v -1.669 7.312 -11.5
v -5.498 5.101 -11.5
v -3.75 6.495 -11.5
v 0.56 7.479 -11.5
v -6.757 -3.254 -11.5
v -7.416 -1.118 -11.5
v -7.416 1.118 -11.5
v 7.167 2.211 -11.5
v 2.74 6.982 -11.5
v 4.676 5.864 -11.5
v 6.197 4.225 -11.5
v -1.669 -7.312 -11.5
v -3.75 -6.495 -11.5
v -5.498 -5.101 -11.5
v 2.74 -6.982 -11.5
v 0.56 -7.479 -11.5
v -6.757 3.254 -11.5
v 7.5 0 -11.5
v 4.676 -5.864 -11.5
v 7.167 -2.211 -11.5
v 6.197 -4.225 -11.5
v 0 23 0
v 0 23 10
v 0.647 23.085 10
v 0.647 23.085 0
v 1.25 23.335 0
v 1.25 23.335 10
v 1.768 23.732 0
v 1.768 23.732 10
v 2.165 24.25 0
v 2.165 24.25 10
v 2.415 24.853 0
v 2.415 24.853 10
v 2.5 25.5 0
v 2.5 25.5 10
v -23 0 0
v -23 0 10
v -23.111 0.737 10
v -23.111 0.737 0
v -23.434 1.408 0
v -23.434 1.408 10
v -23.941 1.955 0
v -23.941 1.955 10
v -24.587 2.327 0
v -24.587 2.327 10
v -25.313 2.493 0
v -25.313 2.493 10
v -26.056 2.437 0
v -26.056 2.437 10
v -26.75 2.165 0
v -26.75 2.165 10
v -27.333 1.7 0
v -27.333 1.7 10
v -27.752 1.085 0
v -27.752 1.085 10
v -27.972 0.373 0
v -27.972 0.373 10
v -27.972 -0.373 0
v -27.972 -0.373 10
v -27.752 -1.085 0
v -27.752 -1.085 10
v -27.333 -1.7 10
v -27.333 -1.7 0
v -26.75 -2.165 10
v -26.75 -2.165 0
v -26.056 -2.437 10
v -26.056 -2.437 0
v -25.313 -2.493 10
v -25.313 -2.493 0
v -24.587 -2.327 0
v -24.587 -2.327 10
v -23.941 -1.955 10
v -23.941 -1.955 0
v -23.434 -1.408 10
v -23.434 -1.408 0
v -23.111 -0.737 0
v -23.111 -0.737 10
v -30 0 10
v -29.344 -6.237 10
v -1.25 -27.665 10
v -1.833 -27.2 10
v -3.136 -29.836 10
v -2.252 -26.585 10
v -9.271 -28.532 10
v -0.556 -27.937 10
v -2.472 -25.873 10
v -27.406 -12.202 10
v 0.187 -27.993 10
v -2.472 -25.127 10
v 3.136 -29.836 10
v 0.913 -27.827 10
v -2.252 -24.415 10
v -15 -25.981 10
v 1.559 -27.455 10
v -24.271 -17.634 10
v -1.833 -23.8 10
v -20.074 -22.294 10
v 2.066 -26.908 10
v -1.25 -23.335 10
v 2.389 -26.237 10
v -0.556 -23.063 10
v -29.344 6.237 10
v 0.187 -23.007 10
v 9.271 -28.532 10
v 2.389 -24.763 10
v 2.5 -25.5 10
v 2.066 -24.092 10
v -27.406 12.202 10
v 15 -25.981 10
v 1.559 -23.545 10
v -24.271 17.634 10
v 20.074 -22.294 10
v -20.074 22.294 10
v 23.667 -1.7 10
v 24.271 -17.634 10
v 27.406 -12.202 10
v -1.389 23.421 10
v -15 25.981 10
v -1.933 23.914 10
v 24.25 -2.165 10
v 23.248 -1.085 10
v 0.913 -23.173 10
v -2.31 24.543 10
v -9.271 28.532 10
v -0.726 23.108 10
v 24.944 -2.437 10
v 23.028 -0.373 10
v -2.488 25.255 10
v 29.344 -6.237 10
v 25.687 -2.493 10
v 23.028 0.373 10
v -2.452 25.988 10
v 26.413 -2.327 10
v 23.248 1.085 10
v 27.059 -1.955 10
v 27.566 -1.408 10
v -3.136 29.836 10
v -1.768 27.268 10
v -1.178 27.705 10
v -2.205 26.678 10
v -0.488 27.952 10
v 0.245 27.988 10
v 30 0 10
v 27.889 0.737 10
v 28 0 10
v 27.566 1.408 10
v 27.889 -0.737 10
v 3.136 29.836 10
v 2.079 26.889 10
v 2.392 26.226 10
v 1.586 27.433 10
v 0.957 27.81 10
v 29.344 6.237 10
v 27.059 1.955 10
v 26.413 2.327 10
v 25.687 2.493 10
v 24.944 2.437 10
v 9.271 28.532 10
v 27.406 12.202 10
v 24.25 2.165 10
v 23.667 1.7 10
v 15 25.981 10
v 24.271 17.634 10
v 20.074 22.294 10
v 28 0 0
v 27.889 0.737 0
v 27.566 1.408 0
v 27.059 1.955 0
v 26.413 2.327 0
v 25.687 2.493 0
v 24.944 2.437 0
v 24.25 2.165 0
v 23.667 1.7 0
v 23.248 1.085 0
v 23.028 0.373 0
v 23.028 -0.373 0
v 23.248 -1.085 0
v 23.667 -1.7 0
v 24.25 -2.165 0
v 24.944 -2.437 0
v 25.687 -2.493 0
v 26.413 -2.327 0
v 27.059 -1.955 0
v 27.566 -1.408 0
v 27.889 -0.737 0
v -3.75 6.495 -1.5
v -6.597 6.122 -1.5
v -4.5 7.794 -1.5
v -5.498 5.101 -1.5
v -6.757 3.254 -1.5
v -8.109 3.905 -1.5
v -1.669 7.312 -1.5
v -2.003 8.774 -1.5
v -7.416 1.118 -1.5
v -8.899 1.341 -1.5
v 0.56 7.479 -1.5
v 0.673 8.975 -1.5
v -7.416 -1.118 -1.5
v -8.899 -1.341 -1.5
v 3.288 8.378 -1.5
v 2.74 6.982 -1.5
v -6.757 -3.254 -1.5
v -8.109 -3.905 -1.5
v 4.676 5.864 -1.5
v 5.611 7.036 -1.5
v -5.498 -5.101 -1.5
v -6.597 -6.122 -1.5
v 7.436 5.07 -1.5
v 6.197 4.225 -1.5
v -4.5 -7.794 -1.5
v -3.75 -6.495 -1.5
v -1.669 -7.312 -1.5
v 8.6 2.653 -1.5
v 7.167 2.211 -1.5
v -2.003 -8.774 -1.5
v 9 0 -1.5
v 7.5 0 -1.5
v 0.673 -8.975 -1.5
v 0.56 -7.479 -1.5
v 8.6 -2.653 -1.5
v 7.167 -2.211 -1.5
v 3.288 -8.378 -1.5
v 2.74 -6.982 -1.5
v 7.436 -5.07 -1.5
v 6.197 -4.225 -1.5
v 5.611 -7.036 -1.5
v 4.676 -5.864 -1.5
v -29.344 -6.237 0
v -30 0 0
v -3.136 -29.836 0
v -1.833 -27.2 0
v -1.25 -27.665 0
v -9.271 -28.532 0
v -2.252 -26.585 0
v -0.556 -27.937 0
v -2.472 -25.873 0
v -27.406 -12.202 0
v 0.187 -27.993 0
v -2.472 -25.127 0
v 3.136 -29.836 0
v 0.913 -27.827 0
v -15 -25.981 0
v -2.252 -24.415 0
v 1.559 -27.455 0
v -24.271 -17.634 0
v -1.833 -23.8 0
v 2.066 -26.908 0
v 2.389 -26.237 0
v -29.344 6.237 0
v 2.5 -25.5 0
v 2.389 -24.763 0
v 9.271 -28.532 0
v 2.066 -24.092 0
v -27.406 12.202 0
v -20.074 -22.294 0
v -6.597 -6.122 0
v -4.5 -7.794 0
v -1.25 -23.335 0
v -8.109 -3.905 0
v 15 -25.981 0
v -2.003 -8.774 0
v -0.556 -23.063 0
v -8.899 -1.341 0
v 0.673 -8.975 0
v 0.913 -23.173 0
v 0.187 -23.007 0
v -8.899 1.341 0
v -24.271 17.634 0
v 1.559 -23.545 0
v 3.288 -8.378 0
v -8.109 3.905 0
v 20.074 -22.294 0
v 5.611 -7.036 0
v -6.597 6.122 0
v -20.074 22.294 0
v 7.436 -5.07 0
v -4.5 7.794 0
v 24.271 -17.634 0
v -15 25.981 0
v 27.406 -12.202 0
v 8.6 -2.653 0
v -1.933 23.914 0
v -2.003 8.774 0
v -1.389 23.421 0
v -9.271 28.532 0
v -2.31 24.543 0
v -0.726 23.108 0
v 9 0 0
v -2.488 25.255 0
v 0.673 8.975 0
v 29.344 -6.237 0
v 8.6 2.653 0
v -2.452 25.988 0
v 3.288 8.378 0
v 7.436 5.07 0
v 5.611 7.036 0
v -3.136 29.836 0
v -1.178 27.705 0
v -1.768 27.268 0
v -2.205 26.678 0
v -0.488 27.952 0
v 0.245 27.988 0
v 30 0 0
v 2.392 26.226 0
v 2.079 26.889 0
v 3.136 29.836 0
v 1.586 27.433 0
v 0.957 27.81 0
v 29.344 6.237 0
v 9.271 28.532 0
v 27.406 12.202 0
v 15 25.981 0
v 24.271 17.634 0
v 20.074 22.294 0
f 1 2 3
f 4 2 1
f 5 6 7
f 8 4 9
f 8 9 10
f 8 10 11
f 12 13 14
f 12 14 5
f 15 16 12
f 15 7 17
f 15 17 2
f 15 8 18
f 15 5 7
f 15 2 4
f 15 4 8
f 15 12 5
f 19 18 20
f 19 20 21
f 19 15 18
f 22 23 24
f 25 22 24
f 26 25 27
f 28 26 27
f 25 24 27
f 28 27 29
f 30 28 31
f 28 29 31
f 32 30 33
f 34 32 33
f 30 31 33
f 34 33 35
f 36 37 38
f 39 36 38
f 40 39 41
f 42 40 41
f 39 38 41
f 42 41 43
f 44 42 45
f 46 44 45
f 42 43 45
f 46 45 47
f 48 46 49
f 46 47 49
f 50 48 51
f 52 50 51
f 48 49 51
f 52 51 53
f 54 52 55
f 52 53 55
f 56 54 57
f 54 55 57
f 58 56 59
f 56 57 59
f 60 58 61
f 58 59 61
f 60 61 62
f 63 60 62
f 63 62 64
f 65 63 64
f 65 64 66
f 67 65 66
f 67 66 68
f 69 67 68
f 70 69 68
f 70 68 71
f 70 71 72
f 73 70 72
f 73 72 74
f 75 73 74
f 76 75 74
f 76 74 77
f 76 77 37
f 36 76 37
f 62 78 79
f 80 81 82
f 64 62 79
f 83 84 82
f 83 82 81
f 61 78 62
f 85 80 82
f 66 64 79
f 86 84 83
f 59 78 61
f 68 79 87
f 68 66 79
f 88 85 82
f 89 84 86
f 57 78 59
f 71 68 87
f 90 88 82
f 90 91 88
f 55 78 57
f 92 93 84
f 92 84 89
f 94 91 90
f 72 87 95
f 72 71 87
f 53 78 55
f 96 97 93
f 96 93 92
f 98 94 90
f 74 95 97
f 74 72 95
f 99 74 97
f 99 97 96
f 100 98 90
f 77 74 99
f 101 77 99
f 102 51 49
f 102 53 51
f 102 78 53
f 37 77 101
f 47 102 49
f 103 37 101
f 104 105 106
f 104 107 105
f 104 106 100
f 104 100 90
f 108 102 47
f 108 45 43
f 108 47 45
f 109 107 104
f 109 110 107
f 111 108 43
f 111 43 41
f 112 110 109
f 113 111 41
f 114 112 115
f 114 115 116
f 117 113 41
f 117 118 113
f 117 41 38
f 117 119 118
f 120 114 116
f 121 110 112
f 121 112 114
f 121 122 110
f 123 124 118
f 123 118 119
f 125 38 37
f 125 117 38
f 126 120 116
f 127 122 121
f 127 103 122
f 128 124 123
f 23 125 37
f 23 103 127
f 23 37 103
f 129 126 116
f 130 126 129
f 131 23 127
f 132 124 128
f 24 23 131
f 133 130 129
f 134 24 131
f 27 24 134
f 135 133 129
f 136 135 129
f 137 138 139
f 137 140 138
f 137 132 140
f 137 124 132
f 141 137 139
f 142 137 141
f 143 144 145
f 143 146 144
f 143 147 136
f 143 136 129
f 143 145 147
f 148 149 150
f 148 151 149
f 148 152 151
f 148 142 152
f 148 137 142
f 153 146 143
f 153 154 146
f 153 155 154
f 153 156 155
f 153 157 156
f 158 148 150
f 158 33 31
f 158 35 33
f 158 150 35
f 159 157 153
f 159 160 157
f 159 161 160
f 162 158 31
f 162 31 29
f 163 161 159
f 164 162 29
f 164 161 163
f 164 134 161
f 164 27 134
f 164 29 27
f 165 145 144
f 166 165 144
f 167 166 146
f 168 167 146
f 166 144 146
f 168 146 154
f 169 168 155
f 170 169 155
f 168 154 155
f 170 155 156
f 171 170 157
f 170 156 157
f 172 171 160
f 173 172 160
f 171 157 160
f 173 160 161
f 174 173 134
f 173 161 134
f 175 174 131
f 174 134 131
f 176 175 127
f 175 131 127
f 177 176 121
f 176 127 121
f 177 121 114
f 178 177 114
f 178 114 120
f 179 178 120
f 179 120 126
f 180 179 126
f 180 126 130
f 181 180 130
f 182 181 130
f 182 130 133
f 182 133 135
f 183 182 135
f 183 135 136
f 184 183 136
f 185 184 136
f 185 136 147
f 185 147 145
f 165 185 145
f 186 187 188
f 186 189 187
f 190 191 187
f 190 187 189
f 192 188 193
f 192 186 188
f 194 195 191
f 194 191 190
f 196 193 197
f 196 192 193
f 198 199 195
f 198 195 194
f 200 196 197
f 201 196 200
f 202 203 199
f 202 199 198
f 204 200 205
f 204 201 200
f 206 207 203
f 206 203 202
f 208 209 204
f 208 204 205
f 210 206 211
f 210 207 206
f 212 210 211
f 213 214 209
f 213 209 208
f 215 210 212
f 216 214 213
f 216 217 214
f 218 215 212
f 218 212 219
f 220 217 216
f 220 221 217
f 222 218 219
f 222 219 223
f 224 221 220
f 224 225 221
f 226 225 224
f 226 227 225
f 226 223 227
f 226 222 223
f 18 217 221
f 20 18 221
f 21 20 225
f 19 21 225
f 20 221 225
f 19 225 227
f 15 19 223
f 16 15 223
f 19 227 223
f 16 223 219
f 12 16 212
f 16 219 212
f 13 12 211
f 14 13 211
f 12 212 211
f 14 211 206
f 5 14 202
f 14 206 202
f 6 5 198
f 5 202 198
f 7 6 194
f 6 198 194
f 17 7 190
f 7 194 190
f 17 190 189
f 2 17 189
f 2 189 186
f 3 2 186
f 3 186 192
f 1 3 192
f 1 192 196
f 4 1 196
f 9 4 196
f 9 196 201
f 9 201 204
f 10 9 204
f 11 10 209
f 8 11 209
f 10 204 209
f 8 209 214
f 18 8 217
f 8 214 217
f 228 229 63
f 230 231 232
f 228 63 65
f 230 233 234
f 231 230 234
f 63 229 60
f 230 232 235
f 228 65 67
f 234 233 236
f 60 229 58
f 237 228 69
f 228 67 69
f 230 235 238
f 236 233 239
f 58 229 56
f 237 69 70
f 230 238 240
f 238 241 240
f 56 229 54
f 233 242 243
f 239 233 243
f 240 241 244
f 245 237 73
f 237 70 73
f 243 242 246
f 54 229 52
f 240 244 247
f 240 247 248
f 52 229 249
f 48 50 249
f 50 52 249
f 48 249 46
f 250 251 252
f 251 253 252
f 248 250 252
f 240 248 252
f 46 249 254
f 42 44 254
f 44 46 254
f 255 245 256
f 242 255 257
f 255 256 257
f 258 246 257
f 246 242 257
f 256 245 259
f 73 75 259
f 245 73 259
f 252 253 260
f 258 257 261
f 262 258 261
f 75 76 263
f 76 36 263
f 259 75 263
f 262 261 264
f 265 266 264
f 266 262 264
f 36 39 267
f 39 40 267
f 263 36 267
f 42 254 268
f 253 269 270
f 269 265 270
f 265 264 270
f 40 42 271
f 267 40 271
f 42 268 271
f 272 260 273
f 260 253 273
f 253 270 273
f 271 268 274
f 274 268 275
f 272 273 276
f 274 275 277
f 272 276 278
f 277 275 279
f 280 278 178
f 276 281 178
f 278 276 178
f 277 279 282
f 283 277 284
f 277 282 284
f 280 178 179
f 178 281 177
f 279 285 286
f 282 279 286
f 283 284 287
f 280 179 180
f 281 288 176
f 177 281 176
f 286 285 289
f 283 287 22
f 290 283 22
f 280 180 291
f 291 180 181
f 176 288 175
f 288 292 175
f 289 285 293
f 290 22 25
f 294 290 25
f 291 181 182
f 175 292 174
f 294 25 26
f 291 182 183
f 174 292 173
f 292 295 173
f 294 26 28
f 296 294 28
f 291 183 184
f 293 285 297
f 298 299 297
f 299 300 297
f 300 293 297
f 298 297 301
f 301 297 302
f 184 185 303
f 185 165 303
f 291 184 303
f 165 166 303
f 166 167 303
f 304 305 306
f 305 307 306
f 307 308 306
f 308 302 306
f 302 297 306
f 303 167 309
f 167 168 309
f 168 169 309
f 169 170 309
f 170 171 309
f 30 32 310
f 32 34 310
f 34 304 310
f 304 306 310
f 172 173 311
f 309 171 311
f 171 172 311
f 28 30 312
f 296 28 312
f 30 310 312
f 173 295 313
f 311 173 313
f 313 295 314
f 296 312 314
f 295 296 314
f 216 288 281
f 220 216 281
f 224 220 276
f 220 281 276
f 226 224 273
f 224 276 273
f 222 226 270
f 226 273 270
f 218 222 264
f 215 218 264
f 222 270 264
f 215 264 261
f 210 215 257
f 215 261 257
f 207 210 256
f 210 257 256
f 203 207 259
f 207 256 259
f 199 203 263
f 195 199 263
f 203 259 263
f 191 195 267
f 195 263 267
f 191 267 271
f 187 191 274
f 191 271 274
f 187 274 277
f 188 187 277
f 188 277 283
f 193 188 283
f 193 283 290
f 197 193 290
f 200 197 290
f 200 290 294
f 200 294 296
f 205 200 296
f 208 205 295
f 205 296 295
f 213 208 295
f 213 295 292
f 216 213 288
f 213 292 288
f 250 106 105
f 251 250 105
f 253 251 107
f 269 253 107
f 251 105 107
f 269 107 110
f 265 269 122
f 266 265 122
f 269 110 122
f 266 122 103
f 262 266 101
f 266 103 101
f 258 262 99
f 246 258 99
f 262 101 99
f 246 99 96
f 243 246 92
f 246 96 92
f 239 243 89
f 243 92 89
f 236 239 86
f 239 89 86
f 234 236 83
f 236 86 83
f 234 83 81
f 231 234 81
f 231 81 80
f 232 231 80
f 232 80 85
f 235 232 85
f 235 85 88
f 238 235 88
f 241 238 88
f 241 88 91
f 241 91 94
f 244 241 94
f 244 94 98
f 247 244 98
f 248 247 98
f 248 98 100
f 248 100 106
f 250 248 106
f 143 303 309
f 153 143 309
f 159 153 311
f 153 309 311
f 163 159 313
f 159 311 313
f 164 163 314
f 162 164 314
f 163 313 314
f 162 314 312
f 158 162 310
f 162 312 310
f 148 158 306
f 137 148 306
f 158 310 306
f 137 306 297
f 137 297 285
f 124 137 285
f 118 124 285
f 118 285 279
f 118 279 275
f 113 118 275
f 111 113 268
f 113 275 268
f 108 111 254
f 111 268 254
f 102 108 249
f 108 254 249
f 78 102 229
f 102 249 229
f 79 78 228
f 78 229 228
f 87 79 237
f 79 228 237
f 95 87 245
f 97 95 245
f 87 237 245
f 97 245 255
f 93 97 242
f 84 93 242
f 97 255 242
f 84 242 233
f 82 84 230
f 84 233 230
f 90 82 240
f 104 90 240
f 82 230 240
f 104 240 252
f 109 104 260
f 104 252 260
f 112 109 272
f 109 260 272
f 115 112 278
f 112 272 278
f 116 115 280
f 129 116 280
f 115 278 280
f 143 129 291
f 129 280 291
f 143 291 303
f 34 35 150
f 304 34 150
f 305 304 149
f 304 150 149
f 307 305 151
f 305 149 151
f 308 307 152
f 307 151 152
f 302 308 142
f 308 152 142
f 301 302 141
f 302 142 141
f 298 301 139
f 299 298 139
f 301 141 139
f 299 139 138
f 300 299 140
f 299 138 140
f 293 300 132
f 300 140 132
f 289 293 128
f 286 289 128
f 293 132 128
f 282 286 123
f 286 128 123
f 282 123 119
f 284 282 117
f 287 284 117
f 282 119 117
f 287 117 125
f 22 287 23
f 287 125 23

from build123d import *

# Parameters (mm, degrees)
F0_R     = 30
F1_DEPTH = 10
F2_R     = 2.5
F3_DEPTH = 10.001
F4_R     = 9
F5_DEPTH = 1.5
F6_R     = 7.5
F7_DEPTH = 10


with BuildPart() as f1:
    # F0 (on Top) → F1 (new body)
    with BuildSketch(Plane.XY):
        Circle(F0_R)
    extrude(amount=F1_DEPTH)

    # F2 (on face) → F3 (cut, through all)
    with BuildSketch(Plane.XY.offset(10)):
        with BuildLine():
            ThreePointArc((0, 23), (1.767767, 23.732233), (2.5, 25.5))
            ThreePointArc((2.5, 25.5), (-1.767767, 27.267767), (0, 23))
        make_face()
        with Locations((25.5, 0)):
            Circle(F2_R)
        with Locations((0, -25.5)):
            Circle(F2_R)
        with Locations((-25.5, 0)):
            Circle(F2_R)
    extrude(amount=-F3_DEPTH, mode=Mode.SUBTRACT)

    # F4 (on face) → F5 (join)
    with BuildSketch(Plane(origin=(0, 0, 0), x_dir=(1, 0, 0), z_dir=(0, 0, -1))):
        Circle(F4_R)
    extrude(amount=F5_DEPTH)

    # F6 (on face) → F7 (join)
    with BuildSketch(Plane(origin=(0, 0, -1.5), x_dir=(1, 0, 0), z_dir=(0, 0, -1))):
        Circle(F6_R)
    extrude(amount=F7_DEPTH)


solid = f1.part
